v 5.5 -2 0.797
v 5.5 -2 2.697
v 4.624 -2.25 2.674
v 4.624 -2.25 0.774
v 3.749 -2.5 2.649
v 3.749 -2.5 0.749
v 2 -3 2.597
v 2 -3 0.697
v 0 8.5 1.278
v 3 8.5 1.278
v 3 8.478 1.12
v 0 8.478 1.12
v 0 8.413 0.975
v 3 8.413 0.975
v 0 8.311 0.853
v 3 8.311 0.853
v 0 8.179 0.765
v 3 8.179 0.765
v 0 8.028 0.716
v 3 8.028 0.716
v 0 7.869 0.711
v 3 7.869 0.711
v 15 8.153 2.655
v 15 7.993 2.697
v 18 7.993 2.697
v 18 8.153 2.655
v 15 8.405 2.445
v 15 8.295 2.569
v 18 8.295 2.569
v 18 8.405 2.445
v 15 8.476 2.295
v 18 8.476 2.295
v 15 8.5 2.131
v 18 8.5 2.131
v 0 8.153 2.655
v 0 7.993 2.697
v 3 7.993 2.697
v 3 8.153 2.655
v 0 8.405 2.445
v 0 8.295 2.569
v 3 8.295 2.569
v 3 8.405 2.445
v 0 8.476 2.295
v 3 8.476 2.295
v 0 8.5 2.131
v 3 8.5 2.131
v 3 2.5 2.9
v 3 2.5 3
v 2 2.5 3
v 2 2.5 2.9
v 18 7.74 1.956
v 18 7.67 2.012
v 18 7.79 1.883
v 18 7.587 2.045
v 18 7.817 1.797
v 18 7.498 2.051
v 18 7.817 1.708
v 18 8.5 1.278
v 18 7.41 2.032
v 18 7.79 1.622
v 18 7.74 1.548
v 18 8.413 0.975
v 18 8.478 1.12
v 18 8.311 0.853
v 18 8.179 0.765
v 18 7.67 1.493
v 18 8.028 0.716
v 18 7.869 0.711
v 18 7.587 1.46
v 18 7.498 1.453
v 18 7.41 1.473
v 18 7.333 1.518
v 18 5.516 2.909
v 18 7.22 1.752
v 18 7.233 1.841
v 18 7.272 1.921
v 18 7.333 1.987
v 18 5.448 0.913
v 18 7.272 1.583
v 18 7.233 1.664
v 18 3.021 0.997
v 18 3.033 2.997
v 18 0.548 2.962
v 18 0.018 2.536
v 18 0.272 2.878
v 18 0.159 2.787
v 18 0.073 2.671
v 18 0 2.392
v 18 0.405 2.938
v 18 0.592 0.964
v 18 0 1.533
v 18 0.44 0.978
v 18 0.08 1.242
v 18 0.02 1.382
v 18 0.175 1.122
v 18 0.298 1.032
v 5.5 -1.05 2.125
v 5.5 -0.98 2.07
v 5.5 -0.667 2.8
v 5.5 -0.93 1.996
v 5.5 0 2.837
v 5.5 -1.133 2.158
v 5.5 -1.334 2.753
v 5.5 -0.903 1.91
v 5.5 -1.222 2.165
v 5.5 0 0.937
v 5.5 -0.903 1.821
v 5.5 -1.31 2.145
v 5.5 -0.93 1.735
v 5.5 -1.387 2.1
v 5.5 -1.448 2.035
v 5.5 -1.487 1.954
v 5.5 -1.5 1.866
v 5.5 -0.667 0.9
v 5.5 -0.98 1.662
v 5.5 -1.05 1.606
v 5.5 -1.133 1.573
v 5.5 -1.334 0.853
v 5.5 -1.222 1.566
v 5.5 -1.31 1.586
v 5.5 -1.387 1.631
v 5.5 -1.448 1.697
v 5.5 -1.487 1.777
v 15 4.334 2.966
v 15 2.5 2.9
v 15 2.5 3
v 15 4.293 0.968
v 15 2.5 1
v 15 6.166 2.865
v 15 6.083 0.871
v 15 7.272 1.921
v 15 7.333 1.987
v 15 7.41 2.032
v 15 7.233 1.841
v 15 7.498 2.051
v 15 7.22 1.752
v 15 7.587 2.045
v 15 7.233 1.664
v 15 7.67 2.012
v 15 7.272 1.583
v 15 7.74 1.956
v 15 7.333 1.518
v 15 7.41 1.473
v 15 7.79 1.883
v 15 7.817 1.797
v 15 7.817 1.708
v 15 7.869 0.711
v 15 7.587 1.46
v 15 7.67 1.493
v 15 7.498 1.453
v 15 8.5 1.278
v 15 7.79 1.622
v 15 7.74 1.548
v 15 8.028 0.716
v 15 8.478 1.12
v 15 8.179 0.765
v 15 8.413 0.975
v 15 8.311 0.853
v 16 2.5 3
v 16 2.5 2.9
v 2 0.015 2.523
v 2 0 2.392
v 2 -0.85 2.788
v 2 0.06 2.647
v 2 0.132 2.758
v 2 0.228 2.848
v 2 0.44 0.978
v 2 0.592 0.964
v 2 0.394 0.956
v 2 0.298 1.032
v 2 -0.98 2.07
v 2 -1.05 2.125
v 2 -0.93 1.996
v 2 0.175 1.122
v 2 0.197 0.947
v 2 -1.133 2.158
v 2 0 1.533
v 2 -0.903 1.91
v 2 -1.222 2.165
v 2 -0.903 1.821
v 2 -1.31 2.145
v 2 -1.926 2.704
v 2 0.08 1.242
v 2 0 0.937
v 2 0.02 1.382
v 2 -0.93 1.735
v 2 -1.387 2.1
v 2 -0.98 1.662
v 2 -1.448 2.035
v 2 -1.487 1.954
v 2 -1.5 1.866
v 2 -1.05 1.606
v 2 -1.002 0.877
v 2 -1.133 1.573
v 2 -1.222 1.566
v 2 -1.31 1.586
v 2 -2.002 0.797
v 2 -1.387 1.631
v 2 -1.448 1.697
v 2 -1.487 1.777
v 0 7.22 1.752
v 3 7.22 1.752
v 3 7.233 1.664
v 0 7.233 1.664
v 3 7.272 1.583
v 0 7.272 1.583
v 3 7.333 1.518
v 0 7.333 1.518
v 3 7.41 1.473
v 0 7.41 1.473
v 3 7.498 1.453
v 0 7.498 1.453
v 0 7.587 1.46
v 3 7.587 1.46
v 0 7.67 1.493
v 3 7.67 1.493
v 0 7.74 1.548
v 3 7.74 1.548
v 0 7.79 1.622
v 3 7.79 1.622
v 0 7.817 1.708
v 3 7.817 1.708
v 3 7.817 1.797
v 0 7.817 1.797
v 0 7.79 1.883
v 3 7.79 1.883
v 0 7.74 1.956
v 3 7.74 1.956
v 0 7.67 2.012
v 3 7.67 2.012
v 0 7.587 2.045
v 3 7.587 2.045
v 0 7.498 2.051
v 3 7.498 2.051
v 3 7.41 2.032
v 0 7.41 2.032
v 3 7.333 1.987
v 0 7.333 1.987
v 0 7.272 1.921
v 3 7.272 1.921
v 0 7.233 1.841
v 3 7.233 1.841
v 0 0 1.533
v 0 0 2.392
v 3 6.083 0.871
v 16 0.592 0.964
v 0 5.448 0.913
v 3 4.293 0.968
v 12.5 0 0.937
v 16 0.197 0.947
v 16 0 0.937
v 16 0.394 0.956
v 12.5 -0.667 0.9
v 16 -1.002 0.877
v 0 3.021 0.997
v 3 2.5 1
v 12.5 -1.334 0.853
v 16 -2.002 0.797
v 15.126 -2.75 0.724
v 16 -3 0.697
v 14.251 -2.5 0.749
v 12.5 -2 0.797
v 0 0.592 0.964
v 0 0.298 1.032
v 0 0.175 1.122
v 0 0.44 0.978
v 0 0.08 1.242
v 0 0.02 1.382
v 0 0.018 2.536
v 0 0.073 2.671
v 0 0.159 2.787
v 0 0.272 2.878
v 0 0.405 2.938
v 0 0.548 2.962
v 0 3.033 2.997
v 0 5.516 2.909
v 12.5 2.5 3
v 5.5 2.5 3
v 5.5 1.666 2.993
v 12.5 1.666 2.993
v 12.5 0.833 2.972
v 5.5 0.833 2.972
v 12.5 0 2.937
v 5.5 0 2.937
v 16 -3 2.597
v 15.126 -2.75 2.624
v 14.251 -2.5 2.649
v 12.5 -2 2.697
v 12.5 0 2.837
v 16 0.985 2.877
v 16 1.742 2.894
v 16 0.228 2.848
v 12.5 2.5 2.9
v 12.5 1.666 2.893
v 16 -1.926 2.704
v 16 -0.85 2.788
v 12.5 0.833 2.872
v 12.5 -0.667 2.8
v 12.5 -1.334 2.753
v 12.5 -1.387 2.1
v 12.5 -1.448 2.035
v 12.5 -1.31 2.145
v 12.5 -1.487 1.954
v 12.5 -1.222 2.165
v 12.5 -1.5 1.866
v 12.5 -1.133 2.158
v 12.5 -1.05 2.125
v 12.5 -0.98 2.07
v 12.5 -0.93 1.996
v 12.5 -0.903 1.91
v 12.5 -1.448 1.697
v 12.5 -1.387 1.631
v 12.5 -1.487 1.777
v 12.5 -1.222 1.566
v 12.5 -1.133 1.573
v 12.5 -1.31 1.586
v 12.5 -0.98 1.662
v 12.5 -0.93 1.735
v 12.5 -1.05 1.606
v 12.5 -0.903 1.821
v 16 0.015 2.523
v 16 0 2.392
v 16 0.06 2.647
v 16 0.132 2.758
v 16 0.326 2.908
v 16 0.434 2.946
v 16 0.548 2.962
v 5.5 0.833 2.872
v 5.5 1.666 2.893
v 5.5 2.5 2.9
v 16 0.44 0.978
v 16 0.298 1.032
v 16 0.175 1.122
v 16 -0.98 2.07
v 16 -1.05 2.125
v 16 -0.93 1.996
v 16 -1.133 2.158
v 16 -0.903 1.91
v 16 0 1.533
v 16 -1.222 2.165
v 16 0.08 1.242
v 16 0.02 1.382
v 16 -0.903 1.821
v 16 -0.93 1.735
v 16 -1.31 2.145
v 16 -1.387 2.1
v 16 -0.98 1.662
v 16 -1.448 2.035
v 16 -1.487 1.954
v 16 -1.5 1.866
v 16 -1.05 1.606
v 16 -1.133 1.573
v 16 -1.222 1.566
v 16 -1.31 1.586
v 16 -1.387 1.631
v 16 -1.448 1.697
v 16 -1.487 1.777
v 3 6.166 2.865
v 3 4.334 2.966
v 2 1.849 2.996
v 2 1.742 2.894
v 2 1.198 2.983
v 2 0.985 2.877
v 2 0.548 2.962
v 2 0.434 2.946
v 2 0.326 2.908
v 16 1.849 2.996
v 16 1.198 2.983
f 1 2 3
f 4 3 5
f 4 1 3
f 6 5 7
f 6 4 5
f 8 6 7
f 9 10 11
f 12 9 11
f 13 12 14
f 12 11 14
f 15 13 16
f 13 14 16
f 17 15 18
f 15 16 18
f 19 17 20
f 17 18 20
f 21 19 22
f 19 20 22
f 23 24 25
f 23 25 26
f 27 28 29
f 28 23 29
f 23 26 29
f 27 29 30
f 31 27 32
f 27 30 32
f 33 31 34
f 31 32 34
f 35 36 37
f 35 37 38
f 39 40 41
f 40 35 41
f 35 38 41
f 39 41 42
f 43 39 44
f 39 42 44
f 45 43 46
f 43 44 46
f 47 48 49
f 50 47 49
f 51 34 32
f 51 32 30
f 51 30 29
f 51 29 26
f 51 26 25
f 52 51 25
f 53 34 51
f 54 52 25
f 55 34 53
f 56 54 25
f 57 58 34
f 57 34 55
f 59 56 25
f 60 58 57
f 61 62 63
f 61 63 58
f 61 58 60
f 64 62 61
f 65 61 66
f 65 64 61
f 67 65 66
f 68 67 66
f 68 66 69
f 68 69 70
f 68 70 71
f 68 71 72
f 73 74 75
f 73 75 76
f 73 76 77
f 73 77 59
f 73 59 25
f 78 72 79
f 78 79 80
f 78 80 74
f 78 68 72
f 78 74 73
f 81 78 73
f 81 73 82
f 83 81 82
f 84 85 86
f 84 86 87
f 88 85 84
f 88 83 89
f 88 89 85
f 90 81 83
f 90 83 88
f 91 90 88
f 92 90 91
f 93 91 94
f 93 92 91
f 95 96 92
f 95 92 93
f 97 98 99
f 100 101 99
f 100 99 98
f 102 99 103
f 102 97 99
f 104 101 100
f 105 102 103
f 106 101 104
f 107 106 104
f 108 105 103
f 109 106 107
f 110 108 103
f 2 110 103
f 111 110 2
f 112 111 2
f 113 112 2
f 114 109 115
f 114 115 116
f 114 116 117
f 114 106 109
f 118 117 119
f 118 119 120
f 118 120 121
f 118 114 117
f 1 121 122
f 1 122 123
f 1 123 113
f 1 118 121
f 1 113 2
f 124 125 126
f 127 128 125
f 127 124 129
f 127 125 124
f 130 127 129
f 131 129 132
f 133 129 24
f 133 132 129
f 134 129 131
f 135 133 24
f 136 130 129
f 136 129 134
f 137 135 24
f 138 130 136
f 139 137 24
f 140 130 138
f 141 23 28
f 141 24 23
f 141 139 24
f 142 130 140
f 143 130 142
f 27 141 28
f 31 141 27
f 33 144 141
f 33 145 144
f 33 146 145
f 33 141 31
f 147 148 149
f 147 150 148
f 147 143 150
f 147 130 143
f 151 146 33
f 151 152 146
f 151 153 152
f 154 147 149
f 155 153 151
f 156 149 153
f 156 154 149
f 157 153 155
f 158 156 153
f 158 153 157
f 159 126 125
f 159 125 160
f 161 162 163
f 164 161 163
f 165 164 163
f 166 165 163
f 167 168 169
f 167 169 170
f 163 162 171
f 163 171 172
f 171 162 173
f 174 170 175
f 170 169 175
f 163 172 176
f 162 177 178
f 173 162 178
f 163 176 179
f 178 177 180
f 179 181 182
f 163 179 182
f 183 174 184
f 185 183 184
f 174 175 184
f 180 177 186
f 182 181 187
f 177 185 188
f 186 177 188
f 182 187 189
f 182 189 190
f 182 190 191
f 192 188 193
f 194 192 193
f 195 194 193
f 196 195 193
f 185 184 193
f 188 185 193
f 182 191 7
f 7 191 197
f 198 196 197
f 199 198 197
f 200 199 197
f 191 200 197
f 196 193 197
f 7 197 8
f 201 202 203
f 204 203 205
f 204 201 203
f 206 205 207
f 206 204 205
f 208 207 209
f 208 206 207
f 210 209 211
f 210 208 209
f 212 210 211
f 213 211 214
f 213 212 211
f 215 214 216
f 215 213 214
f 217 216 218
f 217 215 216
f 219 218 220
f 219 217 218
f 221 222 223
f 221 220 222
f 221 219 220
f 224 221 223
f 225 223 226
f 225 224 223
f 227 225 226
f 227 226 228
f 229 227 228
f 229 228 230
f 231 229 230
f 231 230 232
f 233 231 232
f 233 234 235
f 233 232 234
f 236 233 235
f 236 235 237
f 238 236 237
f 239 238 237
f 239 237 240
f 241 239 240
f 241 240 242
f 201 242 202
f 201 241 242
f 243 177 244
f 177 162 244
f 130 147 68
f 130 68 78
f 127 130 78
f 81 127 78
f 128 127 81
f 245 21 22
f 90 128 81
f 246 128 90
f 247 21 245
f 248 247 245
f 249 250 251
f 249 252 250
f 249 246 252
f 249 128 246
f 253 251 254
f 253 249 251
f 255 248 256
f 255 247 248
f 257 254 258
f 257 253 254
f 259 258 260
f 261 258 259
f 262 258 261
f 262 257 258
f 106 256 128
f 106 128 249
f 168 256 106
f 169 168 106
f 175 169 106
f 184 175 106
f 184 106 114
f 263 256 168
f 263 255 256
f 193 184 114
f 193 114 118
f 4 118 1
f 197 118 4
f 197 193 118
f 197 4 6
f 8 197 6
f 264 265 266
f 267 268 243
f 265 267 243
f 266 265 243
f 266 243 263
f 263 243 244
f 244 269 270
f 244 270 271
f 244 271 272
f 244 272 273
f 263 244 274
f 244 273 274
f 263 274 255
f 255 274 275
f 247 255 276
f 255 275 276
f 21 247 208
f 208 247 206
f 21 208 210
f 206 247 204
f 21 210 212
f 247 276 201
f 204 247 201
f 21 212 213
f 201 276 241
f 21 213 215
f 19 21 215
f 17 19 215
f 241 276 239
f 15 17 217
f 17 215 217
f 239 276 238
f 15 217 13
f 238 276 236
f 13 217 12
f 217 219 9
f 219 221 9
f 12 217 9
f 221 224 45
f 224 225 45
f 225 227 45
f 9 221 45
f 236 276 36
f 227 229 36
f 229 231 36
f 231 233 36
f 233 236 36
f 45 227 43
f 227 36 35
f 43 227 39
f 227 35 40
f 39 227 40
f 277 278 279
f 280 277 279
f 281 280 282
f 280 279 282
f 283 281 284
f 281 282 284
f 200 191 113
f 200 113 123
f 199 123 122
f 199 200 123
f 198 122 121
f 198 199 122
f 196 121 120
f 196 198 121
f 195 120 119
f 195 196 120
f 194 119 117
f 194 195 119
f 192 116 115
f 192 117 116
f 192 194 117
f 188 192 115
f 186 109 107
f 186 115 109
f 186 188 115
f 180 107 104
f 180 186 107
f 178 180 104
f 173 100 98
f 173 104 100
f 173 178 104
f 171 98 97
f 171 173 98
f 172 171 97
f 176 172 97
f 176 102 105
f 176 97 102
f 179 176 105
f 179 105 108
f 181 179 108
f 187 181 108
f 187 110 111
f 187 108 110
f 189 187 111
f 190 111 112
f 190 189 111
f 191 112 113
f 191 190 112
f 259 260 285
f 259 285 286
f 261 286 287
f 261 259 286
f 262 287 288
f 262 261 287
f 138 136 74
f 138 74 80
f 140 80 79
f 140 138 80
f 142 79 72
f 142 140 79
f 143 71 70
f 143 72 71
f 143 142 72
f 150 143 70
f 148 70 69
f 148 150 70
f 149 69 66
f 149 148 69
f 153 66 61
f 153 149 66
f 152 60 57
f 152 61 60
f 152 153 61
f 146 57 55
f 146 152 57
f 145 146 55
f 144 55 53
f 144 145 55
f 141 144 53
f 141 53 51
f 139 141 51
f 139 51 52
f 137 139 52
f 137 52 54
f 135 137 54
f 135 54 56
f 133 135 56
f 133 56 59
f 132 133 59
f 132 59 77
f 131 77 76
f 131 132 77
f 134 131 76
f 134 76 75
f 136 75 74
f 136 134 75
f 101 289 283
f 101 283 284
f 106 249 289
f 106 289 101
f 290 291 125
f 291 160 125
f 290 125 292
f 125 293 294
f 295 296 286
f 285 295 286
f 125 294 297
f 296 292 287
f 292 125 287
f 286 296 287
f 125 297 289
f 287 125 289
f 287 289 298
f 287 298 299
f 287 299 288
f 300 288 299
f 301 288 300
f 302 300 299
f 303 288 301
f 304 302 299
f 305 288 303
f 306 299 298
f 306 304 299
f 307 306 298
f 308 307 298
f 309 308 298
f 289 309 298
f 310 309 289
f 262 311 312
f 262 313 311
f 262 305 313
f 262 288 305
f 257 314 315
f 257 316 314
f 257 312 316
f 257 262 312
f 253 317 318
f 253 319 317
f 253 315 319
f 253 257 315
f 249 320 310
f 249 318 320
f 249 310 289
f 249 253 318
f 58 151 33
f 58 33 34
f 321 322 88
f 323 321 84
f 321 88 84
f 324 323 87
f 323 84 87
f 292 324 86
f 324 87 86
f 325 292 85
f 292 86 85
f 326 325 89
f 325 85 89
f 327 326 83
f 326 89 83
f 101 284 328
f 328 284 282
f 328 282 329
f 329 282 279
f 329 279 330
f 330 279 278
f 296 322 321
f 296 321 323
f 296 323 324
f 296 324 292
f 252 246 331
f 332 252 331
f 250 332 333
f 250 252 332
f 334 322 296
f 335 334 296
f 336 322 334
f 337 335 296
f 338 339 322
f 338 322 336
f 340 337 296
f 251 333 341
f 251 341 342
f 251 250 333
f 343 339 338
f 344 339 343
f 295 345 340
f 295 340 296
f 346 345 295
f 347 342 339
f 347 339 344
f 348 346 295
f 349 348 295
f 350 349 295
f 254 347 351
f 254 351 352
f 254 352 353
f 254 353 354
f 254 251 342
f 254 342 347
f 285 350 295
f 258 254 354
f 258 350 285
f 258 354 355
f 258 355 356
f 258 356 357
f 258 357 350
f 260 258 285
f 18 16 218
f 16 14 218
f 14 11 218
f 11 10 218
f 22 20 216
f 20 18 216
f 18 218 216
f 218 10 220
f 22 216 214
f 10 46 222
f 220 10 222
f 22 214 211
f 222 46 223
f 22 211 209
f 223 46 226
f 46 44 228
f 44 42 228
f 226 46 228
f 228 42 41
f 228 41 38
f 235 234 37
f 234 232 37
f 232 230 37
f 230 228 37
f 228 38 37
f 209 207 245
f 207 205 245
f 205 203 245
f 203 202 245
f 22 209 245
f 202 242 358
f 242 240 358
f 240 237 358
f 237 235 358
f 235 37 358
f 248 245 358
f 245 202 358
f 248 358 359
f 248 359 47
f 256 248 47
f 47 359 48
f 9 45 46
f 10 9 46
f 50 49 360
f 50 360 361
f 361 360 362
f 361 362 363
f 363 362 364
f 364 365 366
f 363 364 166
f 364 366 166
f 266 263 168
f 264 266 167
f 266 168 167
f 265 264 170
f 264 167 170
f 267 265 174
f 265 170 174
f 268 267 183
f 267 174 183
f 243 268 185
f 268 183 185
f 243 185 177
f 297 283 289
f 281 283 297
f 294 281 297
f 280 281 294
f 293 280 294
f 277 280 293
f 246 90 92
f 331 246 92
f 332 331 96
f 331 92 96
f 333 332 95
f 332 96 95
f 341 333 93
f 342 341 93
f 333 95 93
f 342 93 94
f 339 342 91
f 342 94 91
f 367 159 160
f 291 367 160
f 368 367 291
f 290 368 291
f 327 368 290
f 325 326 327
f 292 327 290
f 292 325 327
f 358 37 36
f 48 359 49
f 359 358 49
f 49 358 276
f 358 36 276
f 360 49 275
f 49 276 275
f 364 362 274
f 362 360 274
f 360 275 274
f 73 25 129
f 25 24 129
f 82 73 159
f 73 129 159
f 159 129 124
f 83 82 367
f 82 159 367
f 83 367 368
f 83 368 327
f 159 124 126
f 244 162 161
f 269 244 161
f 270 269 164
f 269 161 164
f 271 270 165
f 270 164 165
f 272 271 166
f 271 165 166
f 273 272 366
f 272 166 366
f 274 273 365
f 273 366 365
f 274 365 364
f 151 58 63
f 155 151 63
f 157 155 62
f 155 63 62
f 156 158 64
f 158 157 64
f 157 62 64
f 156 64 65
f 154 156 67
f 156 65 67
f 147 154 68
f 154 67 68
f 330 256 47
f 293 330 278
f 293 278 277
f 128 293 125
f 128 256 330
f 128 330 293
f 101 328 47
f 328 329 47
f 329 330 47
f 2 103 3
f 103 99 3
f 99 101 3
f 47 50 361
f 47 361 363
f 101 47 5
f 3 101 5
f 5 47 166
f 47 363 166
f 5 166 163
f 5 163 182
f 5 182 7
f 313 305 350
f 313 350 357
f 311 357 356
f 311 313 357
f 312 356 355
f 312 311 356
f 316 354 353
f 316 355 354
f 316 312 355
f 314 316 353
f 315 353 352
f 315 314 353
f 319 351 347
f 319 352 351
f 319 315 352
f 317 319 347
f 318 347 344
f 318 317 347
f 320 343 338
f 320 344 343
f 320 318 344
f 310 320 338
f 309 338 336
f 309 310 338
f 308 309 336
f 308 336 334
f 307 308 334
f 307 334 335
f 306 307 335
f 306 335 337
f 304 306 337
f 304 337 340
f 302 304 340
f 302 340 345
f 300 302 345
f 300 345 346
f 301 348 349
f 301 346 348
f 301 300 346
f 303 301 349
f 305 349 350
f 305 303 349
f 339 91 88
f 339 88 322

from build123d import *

# Parameters (mm, degrees)
BOSS_EXTRUDE2_DEPTH = 5
SKETCH8_R           = 50
CUT_EXTRUDE6_DEPTH  = 20
SKETCH9_OUTSIDE_W   = 10.721
SKETCH9_OUTSIDE_H   = 17.86
SKETCH9_OUTSIDE_R   = 50
CUT_EXTRUDE7_DEPTH  = 20
SKETCH11_W          = 7
SKETCH11_H          = 2.5
BOSS_EXTRUDE4_DEPTH = 2
SKETCH12_OUTSIDE_W  = 9.685
SKETCH12_OUTSIDE_H  = 17.824
SKETCH12_OUTSIDE_R  = 50
CUT_EXTRUDE8_DEPTH  = 20
SKETCH13_R          = 0.3
CUT_EXTRUDE10_DEPTH = 21.130822139
SKETCH14_R          = 0.3
CUT_EXTRUDE11_DEPTH = 20
FILLET1_R           = 0.57


with BuildPart() as part:
    # Sketch1 → Boss-Extrude2 (new body)
    with BuildSketch(Plane.XY):
        Polygon((0, 0), (0, 8.5), (3, 8.5), (3, 2.5), (15, 2.5), (15, 8.5), (18, 8.5), (18, 0), (16, 0), (16, -3), (12.5, -2), (12.5, 0), (5.5, 0), (5.5, -2), (2, -3), (2, 0), align=None)
    extrude(amount=BOSS_EXTRUDE2_DEPTH)

    # Sketch8 → Cut-Extrude6 (cut)
    with BuildSketch(Plane(origin=(0, 0, 0), x_dir=(0, 0, -1), z_dir=(1, 0, 0))):
        with Locations((49, 2.5)):
            Circle(SKETCH8_R)
    extrude(amount=CUT_EXTRUDE6_DEPTH, mode=Mode.SUBTRACT)

    # Sketch9 outside → Cut-Extrude7 (cut)
    with BuildSketch(Plane(origin=(0, 0, 0), x_dir=(0, 0, -1), z_dir=(1, 0, 0))):
        with Locations((-2.8195, 2.75)):
            Rectangle(SKETCH9_OUTSIDE_W, SKETCH9_OUTSIDE_H)
        with Locations((47.1, 2.5)):
            Circle(SKETCH9_OUTSIDE_R, mode=Mode.SUBTRACT)
    extrude(amount=CUT_EXTRUDE7_DEPTH, mode=Mode.SUBTRACT)

    # Sketch11 → Boss-Extrude4 (add)
    with BuildSketch(Plane.XY.offset(4)):
        Polygon((0, 0), (0, 8.5), (3, 8.5), (3, 2.5), (2, 2.5), (2, 0), align=None)
        with Locations((9, 1.25)):
            Rectangle(SKETCH11_W, SKETCH11_H)
        Polygon((18, 8.5), (15, 8.5), (15, 2.5), (16, 2.5), (16, 0), (18, 0), align=None)
    extrude(amount=-BOSS_EXTRUDE4_DEPTH)

    # Sketch12 outside → Cut-Extrude8 (cut)
    with BuildSketch(Plane(origin=(0, 0, 0), x_dir=(0, 0, -1), z_dir=(1, 0, 0))):
        with Locations((-2.3195, 2.75)):
            Rectangle(SKETCH12_OUTSIDE_W, SKETCH12_OUTSIDE_H)
        with Locations((47, 2.5)):
            Circle(SKETCH12_OUTSIDE_R, mode=Mode.SUBTRACT)
    extrude(amount=CUT_EXTRUDE8_DEPTH, mode=Mode.SUBTRACT)

    # Sketch13 → Cut-Extrude10 (cut, through all)
    with BuildSketch(Plane(origin=(0, 0, 0), x_dir=(0, 0, -1), z_dir=(1, 0, 0))):
        with Locations(Location((-1.752335907, 7.52, 0), (0, 0, 270))):
            Circle(SKETCH13_R)
    extrude(amount=CUT_EXTRUDE10_DEPTH, mode=Mode.SUBTRACT)

    # Sketch14 → Cut-Extrude11 (cut)
    with BuildSketch(Plane(origin=(0, 0, 0), x_dir=(0, 0, -1), z_dir=(1, 0, 0))):
        with Locations(Location((-1.865607241, -1.2, 0), (0, 0, 270))):
            Circle(SKETCH14_R)
    extrude(amount=CUT_EXTRUDE11_DEPTH, mode=Mode.SUBTRACT)

    # Fillet1
    # the kernel refuses this fillet: 0.57 mm, written as the material it takes off along each edge
    with BuildSketch(Plane(origin=(4.276921505, 8.5, 2.638694584), x_dir=(0, 0, -1), z_dir=(-1, 0, 0)), Plane(origin=(19.276921505, 8.5, 2.638694584), x_dir=(0, 0, -1), z_dir=(-1, 0, 0))) as fillet1_piece_1:
        with BuildLine():
            CenterArc((0.507848876, 0.57), FILLET1_R, 186.30680233, 83.69319767)
            ThreePointArc((-0.058701439, 0.50738418), (-0.029998613, 0.253617132), (0, 0))
            Line((0, 0), (0.507848876, 0))
        make_face()
    extrude(amount=5.553843009, mode=Mode.SUBTRACT)
    with BuildSketch(Plane(origin=(2, 0, 2.937460889), x_dir=(0, 0.9990083494707687, 0.0445232263845563), z_dir=(-1, 0, 0))) as fillet1_piece_2:
        with BuildLine():
            CenterArc((0.545162753, 0.569991432), FILLET1_R, 182.551836528, 87.762310927)
            Line((-0.024272006, 0.544613193), (0, 0))
            ThreePointArc((0, 0), (0.274143997, -0.000751555), (0.548287995, 0))
        make_face()
    extrude(amount=3.370719987, mode=Mode.SUBTRACT)
    with BuildSketch(Plane(origin=(19.370719987, 0, 2.937460889), x_dir=(0, 0, -1), z_dir=(-1, 0, 0))) as fillet1_piece_3:
        with BuildLine():
            CenterArc((0.545153795, -0.57), FILLET1_R, 90, 87.762310927)
            ThreePointArc((-0.024411551, -0.547744285), (-0.012956585, -0.273838681), (0, 0))
            Line((0, 0), (0.545153795, 0))
        make_face()
    extrude(amount=3.370719987, mode=Mode.SUBTRACT)
    with BuildSketch(Plane(origin=(2, 0, 0.937460889), x_dir=(0, 0.9990278617443559, 0.04408323330360469), z_dir=(-1, 0, 0)), Plane(origin=(19.489241357, 0, 0.937460889), x_dir=(0, 0.9990278617443559, 0.04408323330360409), z_dir=(-1, 0, 0))) as fillet1_piece_4:
        with BuildLine():
            CenterArc((0.595706111, -0.569990001), FILLET1_R, 90.339381978, 92.187220026)
            Line((0.02626023, -0.595117444), (0, 0))
            ThreePointArc((0, 0), (0.296164915, -0.000877144), (0.592329831, 0))
        make_face()
    extrude(amount=3.489241357, mode=Mode.SUBTRACT)
    with BuildSketch(Plane(origin=(4.59733659, 8.5, 0.638694584), x_dir=(0, 0, 1), z_dir=(-1, 0, 0))) as fillet1_piece_5:
        with BuildLine():
            CenterArc((0.638934636, -0.57), FILLET1_R, 90, 96.164070516)
            ThreePointArc((0.072230095, -0.631204271), (0.037117605, -0.315487411), (0, 0))
            Line((0, 0), (0.638934636, 0))
        make_face()
    extrude(amount=6.194673181, mode=Mode.SUBTRACT)
    with BuildSketch(Plane(origin=(19.59733659, 8.5, 0.638694584), x_dir=(0, -0.993516243777255, 0.1136902517841086), z_dir=(-1, 0, 0))) as fillet1_piece_6:
        with BuildLine():
            CenterArc((0.638944899, 0.569988496), FILLET1_R, 173.471913452, 96.164070516)
            Line((0.07264064, 0.63479194), (0, 0))
            ThreePointArc((0, 0), (0.317661777, 0.0010091), (0.635323554, 0))
        make_face()
    extrude(amount=6.194673181, mode=Mode.SUBTRACT)


solid = part.part
